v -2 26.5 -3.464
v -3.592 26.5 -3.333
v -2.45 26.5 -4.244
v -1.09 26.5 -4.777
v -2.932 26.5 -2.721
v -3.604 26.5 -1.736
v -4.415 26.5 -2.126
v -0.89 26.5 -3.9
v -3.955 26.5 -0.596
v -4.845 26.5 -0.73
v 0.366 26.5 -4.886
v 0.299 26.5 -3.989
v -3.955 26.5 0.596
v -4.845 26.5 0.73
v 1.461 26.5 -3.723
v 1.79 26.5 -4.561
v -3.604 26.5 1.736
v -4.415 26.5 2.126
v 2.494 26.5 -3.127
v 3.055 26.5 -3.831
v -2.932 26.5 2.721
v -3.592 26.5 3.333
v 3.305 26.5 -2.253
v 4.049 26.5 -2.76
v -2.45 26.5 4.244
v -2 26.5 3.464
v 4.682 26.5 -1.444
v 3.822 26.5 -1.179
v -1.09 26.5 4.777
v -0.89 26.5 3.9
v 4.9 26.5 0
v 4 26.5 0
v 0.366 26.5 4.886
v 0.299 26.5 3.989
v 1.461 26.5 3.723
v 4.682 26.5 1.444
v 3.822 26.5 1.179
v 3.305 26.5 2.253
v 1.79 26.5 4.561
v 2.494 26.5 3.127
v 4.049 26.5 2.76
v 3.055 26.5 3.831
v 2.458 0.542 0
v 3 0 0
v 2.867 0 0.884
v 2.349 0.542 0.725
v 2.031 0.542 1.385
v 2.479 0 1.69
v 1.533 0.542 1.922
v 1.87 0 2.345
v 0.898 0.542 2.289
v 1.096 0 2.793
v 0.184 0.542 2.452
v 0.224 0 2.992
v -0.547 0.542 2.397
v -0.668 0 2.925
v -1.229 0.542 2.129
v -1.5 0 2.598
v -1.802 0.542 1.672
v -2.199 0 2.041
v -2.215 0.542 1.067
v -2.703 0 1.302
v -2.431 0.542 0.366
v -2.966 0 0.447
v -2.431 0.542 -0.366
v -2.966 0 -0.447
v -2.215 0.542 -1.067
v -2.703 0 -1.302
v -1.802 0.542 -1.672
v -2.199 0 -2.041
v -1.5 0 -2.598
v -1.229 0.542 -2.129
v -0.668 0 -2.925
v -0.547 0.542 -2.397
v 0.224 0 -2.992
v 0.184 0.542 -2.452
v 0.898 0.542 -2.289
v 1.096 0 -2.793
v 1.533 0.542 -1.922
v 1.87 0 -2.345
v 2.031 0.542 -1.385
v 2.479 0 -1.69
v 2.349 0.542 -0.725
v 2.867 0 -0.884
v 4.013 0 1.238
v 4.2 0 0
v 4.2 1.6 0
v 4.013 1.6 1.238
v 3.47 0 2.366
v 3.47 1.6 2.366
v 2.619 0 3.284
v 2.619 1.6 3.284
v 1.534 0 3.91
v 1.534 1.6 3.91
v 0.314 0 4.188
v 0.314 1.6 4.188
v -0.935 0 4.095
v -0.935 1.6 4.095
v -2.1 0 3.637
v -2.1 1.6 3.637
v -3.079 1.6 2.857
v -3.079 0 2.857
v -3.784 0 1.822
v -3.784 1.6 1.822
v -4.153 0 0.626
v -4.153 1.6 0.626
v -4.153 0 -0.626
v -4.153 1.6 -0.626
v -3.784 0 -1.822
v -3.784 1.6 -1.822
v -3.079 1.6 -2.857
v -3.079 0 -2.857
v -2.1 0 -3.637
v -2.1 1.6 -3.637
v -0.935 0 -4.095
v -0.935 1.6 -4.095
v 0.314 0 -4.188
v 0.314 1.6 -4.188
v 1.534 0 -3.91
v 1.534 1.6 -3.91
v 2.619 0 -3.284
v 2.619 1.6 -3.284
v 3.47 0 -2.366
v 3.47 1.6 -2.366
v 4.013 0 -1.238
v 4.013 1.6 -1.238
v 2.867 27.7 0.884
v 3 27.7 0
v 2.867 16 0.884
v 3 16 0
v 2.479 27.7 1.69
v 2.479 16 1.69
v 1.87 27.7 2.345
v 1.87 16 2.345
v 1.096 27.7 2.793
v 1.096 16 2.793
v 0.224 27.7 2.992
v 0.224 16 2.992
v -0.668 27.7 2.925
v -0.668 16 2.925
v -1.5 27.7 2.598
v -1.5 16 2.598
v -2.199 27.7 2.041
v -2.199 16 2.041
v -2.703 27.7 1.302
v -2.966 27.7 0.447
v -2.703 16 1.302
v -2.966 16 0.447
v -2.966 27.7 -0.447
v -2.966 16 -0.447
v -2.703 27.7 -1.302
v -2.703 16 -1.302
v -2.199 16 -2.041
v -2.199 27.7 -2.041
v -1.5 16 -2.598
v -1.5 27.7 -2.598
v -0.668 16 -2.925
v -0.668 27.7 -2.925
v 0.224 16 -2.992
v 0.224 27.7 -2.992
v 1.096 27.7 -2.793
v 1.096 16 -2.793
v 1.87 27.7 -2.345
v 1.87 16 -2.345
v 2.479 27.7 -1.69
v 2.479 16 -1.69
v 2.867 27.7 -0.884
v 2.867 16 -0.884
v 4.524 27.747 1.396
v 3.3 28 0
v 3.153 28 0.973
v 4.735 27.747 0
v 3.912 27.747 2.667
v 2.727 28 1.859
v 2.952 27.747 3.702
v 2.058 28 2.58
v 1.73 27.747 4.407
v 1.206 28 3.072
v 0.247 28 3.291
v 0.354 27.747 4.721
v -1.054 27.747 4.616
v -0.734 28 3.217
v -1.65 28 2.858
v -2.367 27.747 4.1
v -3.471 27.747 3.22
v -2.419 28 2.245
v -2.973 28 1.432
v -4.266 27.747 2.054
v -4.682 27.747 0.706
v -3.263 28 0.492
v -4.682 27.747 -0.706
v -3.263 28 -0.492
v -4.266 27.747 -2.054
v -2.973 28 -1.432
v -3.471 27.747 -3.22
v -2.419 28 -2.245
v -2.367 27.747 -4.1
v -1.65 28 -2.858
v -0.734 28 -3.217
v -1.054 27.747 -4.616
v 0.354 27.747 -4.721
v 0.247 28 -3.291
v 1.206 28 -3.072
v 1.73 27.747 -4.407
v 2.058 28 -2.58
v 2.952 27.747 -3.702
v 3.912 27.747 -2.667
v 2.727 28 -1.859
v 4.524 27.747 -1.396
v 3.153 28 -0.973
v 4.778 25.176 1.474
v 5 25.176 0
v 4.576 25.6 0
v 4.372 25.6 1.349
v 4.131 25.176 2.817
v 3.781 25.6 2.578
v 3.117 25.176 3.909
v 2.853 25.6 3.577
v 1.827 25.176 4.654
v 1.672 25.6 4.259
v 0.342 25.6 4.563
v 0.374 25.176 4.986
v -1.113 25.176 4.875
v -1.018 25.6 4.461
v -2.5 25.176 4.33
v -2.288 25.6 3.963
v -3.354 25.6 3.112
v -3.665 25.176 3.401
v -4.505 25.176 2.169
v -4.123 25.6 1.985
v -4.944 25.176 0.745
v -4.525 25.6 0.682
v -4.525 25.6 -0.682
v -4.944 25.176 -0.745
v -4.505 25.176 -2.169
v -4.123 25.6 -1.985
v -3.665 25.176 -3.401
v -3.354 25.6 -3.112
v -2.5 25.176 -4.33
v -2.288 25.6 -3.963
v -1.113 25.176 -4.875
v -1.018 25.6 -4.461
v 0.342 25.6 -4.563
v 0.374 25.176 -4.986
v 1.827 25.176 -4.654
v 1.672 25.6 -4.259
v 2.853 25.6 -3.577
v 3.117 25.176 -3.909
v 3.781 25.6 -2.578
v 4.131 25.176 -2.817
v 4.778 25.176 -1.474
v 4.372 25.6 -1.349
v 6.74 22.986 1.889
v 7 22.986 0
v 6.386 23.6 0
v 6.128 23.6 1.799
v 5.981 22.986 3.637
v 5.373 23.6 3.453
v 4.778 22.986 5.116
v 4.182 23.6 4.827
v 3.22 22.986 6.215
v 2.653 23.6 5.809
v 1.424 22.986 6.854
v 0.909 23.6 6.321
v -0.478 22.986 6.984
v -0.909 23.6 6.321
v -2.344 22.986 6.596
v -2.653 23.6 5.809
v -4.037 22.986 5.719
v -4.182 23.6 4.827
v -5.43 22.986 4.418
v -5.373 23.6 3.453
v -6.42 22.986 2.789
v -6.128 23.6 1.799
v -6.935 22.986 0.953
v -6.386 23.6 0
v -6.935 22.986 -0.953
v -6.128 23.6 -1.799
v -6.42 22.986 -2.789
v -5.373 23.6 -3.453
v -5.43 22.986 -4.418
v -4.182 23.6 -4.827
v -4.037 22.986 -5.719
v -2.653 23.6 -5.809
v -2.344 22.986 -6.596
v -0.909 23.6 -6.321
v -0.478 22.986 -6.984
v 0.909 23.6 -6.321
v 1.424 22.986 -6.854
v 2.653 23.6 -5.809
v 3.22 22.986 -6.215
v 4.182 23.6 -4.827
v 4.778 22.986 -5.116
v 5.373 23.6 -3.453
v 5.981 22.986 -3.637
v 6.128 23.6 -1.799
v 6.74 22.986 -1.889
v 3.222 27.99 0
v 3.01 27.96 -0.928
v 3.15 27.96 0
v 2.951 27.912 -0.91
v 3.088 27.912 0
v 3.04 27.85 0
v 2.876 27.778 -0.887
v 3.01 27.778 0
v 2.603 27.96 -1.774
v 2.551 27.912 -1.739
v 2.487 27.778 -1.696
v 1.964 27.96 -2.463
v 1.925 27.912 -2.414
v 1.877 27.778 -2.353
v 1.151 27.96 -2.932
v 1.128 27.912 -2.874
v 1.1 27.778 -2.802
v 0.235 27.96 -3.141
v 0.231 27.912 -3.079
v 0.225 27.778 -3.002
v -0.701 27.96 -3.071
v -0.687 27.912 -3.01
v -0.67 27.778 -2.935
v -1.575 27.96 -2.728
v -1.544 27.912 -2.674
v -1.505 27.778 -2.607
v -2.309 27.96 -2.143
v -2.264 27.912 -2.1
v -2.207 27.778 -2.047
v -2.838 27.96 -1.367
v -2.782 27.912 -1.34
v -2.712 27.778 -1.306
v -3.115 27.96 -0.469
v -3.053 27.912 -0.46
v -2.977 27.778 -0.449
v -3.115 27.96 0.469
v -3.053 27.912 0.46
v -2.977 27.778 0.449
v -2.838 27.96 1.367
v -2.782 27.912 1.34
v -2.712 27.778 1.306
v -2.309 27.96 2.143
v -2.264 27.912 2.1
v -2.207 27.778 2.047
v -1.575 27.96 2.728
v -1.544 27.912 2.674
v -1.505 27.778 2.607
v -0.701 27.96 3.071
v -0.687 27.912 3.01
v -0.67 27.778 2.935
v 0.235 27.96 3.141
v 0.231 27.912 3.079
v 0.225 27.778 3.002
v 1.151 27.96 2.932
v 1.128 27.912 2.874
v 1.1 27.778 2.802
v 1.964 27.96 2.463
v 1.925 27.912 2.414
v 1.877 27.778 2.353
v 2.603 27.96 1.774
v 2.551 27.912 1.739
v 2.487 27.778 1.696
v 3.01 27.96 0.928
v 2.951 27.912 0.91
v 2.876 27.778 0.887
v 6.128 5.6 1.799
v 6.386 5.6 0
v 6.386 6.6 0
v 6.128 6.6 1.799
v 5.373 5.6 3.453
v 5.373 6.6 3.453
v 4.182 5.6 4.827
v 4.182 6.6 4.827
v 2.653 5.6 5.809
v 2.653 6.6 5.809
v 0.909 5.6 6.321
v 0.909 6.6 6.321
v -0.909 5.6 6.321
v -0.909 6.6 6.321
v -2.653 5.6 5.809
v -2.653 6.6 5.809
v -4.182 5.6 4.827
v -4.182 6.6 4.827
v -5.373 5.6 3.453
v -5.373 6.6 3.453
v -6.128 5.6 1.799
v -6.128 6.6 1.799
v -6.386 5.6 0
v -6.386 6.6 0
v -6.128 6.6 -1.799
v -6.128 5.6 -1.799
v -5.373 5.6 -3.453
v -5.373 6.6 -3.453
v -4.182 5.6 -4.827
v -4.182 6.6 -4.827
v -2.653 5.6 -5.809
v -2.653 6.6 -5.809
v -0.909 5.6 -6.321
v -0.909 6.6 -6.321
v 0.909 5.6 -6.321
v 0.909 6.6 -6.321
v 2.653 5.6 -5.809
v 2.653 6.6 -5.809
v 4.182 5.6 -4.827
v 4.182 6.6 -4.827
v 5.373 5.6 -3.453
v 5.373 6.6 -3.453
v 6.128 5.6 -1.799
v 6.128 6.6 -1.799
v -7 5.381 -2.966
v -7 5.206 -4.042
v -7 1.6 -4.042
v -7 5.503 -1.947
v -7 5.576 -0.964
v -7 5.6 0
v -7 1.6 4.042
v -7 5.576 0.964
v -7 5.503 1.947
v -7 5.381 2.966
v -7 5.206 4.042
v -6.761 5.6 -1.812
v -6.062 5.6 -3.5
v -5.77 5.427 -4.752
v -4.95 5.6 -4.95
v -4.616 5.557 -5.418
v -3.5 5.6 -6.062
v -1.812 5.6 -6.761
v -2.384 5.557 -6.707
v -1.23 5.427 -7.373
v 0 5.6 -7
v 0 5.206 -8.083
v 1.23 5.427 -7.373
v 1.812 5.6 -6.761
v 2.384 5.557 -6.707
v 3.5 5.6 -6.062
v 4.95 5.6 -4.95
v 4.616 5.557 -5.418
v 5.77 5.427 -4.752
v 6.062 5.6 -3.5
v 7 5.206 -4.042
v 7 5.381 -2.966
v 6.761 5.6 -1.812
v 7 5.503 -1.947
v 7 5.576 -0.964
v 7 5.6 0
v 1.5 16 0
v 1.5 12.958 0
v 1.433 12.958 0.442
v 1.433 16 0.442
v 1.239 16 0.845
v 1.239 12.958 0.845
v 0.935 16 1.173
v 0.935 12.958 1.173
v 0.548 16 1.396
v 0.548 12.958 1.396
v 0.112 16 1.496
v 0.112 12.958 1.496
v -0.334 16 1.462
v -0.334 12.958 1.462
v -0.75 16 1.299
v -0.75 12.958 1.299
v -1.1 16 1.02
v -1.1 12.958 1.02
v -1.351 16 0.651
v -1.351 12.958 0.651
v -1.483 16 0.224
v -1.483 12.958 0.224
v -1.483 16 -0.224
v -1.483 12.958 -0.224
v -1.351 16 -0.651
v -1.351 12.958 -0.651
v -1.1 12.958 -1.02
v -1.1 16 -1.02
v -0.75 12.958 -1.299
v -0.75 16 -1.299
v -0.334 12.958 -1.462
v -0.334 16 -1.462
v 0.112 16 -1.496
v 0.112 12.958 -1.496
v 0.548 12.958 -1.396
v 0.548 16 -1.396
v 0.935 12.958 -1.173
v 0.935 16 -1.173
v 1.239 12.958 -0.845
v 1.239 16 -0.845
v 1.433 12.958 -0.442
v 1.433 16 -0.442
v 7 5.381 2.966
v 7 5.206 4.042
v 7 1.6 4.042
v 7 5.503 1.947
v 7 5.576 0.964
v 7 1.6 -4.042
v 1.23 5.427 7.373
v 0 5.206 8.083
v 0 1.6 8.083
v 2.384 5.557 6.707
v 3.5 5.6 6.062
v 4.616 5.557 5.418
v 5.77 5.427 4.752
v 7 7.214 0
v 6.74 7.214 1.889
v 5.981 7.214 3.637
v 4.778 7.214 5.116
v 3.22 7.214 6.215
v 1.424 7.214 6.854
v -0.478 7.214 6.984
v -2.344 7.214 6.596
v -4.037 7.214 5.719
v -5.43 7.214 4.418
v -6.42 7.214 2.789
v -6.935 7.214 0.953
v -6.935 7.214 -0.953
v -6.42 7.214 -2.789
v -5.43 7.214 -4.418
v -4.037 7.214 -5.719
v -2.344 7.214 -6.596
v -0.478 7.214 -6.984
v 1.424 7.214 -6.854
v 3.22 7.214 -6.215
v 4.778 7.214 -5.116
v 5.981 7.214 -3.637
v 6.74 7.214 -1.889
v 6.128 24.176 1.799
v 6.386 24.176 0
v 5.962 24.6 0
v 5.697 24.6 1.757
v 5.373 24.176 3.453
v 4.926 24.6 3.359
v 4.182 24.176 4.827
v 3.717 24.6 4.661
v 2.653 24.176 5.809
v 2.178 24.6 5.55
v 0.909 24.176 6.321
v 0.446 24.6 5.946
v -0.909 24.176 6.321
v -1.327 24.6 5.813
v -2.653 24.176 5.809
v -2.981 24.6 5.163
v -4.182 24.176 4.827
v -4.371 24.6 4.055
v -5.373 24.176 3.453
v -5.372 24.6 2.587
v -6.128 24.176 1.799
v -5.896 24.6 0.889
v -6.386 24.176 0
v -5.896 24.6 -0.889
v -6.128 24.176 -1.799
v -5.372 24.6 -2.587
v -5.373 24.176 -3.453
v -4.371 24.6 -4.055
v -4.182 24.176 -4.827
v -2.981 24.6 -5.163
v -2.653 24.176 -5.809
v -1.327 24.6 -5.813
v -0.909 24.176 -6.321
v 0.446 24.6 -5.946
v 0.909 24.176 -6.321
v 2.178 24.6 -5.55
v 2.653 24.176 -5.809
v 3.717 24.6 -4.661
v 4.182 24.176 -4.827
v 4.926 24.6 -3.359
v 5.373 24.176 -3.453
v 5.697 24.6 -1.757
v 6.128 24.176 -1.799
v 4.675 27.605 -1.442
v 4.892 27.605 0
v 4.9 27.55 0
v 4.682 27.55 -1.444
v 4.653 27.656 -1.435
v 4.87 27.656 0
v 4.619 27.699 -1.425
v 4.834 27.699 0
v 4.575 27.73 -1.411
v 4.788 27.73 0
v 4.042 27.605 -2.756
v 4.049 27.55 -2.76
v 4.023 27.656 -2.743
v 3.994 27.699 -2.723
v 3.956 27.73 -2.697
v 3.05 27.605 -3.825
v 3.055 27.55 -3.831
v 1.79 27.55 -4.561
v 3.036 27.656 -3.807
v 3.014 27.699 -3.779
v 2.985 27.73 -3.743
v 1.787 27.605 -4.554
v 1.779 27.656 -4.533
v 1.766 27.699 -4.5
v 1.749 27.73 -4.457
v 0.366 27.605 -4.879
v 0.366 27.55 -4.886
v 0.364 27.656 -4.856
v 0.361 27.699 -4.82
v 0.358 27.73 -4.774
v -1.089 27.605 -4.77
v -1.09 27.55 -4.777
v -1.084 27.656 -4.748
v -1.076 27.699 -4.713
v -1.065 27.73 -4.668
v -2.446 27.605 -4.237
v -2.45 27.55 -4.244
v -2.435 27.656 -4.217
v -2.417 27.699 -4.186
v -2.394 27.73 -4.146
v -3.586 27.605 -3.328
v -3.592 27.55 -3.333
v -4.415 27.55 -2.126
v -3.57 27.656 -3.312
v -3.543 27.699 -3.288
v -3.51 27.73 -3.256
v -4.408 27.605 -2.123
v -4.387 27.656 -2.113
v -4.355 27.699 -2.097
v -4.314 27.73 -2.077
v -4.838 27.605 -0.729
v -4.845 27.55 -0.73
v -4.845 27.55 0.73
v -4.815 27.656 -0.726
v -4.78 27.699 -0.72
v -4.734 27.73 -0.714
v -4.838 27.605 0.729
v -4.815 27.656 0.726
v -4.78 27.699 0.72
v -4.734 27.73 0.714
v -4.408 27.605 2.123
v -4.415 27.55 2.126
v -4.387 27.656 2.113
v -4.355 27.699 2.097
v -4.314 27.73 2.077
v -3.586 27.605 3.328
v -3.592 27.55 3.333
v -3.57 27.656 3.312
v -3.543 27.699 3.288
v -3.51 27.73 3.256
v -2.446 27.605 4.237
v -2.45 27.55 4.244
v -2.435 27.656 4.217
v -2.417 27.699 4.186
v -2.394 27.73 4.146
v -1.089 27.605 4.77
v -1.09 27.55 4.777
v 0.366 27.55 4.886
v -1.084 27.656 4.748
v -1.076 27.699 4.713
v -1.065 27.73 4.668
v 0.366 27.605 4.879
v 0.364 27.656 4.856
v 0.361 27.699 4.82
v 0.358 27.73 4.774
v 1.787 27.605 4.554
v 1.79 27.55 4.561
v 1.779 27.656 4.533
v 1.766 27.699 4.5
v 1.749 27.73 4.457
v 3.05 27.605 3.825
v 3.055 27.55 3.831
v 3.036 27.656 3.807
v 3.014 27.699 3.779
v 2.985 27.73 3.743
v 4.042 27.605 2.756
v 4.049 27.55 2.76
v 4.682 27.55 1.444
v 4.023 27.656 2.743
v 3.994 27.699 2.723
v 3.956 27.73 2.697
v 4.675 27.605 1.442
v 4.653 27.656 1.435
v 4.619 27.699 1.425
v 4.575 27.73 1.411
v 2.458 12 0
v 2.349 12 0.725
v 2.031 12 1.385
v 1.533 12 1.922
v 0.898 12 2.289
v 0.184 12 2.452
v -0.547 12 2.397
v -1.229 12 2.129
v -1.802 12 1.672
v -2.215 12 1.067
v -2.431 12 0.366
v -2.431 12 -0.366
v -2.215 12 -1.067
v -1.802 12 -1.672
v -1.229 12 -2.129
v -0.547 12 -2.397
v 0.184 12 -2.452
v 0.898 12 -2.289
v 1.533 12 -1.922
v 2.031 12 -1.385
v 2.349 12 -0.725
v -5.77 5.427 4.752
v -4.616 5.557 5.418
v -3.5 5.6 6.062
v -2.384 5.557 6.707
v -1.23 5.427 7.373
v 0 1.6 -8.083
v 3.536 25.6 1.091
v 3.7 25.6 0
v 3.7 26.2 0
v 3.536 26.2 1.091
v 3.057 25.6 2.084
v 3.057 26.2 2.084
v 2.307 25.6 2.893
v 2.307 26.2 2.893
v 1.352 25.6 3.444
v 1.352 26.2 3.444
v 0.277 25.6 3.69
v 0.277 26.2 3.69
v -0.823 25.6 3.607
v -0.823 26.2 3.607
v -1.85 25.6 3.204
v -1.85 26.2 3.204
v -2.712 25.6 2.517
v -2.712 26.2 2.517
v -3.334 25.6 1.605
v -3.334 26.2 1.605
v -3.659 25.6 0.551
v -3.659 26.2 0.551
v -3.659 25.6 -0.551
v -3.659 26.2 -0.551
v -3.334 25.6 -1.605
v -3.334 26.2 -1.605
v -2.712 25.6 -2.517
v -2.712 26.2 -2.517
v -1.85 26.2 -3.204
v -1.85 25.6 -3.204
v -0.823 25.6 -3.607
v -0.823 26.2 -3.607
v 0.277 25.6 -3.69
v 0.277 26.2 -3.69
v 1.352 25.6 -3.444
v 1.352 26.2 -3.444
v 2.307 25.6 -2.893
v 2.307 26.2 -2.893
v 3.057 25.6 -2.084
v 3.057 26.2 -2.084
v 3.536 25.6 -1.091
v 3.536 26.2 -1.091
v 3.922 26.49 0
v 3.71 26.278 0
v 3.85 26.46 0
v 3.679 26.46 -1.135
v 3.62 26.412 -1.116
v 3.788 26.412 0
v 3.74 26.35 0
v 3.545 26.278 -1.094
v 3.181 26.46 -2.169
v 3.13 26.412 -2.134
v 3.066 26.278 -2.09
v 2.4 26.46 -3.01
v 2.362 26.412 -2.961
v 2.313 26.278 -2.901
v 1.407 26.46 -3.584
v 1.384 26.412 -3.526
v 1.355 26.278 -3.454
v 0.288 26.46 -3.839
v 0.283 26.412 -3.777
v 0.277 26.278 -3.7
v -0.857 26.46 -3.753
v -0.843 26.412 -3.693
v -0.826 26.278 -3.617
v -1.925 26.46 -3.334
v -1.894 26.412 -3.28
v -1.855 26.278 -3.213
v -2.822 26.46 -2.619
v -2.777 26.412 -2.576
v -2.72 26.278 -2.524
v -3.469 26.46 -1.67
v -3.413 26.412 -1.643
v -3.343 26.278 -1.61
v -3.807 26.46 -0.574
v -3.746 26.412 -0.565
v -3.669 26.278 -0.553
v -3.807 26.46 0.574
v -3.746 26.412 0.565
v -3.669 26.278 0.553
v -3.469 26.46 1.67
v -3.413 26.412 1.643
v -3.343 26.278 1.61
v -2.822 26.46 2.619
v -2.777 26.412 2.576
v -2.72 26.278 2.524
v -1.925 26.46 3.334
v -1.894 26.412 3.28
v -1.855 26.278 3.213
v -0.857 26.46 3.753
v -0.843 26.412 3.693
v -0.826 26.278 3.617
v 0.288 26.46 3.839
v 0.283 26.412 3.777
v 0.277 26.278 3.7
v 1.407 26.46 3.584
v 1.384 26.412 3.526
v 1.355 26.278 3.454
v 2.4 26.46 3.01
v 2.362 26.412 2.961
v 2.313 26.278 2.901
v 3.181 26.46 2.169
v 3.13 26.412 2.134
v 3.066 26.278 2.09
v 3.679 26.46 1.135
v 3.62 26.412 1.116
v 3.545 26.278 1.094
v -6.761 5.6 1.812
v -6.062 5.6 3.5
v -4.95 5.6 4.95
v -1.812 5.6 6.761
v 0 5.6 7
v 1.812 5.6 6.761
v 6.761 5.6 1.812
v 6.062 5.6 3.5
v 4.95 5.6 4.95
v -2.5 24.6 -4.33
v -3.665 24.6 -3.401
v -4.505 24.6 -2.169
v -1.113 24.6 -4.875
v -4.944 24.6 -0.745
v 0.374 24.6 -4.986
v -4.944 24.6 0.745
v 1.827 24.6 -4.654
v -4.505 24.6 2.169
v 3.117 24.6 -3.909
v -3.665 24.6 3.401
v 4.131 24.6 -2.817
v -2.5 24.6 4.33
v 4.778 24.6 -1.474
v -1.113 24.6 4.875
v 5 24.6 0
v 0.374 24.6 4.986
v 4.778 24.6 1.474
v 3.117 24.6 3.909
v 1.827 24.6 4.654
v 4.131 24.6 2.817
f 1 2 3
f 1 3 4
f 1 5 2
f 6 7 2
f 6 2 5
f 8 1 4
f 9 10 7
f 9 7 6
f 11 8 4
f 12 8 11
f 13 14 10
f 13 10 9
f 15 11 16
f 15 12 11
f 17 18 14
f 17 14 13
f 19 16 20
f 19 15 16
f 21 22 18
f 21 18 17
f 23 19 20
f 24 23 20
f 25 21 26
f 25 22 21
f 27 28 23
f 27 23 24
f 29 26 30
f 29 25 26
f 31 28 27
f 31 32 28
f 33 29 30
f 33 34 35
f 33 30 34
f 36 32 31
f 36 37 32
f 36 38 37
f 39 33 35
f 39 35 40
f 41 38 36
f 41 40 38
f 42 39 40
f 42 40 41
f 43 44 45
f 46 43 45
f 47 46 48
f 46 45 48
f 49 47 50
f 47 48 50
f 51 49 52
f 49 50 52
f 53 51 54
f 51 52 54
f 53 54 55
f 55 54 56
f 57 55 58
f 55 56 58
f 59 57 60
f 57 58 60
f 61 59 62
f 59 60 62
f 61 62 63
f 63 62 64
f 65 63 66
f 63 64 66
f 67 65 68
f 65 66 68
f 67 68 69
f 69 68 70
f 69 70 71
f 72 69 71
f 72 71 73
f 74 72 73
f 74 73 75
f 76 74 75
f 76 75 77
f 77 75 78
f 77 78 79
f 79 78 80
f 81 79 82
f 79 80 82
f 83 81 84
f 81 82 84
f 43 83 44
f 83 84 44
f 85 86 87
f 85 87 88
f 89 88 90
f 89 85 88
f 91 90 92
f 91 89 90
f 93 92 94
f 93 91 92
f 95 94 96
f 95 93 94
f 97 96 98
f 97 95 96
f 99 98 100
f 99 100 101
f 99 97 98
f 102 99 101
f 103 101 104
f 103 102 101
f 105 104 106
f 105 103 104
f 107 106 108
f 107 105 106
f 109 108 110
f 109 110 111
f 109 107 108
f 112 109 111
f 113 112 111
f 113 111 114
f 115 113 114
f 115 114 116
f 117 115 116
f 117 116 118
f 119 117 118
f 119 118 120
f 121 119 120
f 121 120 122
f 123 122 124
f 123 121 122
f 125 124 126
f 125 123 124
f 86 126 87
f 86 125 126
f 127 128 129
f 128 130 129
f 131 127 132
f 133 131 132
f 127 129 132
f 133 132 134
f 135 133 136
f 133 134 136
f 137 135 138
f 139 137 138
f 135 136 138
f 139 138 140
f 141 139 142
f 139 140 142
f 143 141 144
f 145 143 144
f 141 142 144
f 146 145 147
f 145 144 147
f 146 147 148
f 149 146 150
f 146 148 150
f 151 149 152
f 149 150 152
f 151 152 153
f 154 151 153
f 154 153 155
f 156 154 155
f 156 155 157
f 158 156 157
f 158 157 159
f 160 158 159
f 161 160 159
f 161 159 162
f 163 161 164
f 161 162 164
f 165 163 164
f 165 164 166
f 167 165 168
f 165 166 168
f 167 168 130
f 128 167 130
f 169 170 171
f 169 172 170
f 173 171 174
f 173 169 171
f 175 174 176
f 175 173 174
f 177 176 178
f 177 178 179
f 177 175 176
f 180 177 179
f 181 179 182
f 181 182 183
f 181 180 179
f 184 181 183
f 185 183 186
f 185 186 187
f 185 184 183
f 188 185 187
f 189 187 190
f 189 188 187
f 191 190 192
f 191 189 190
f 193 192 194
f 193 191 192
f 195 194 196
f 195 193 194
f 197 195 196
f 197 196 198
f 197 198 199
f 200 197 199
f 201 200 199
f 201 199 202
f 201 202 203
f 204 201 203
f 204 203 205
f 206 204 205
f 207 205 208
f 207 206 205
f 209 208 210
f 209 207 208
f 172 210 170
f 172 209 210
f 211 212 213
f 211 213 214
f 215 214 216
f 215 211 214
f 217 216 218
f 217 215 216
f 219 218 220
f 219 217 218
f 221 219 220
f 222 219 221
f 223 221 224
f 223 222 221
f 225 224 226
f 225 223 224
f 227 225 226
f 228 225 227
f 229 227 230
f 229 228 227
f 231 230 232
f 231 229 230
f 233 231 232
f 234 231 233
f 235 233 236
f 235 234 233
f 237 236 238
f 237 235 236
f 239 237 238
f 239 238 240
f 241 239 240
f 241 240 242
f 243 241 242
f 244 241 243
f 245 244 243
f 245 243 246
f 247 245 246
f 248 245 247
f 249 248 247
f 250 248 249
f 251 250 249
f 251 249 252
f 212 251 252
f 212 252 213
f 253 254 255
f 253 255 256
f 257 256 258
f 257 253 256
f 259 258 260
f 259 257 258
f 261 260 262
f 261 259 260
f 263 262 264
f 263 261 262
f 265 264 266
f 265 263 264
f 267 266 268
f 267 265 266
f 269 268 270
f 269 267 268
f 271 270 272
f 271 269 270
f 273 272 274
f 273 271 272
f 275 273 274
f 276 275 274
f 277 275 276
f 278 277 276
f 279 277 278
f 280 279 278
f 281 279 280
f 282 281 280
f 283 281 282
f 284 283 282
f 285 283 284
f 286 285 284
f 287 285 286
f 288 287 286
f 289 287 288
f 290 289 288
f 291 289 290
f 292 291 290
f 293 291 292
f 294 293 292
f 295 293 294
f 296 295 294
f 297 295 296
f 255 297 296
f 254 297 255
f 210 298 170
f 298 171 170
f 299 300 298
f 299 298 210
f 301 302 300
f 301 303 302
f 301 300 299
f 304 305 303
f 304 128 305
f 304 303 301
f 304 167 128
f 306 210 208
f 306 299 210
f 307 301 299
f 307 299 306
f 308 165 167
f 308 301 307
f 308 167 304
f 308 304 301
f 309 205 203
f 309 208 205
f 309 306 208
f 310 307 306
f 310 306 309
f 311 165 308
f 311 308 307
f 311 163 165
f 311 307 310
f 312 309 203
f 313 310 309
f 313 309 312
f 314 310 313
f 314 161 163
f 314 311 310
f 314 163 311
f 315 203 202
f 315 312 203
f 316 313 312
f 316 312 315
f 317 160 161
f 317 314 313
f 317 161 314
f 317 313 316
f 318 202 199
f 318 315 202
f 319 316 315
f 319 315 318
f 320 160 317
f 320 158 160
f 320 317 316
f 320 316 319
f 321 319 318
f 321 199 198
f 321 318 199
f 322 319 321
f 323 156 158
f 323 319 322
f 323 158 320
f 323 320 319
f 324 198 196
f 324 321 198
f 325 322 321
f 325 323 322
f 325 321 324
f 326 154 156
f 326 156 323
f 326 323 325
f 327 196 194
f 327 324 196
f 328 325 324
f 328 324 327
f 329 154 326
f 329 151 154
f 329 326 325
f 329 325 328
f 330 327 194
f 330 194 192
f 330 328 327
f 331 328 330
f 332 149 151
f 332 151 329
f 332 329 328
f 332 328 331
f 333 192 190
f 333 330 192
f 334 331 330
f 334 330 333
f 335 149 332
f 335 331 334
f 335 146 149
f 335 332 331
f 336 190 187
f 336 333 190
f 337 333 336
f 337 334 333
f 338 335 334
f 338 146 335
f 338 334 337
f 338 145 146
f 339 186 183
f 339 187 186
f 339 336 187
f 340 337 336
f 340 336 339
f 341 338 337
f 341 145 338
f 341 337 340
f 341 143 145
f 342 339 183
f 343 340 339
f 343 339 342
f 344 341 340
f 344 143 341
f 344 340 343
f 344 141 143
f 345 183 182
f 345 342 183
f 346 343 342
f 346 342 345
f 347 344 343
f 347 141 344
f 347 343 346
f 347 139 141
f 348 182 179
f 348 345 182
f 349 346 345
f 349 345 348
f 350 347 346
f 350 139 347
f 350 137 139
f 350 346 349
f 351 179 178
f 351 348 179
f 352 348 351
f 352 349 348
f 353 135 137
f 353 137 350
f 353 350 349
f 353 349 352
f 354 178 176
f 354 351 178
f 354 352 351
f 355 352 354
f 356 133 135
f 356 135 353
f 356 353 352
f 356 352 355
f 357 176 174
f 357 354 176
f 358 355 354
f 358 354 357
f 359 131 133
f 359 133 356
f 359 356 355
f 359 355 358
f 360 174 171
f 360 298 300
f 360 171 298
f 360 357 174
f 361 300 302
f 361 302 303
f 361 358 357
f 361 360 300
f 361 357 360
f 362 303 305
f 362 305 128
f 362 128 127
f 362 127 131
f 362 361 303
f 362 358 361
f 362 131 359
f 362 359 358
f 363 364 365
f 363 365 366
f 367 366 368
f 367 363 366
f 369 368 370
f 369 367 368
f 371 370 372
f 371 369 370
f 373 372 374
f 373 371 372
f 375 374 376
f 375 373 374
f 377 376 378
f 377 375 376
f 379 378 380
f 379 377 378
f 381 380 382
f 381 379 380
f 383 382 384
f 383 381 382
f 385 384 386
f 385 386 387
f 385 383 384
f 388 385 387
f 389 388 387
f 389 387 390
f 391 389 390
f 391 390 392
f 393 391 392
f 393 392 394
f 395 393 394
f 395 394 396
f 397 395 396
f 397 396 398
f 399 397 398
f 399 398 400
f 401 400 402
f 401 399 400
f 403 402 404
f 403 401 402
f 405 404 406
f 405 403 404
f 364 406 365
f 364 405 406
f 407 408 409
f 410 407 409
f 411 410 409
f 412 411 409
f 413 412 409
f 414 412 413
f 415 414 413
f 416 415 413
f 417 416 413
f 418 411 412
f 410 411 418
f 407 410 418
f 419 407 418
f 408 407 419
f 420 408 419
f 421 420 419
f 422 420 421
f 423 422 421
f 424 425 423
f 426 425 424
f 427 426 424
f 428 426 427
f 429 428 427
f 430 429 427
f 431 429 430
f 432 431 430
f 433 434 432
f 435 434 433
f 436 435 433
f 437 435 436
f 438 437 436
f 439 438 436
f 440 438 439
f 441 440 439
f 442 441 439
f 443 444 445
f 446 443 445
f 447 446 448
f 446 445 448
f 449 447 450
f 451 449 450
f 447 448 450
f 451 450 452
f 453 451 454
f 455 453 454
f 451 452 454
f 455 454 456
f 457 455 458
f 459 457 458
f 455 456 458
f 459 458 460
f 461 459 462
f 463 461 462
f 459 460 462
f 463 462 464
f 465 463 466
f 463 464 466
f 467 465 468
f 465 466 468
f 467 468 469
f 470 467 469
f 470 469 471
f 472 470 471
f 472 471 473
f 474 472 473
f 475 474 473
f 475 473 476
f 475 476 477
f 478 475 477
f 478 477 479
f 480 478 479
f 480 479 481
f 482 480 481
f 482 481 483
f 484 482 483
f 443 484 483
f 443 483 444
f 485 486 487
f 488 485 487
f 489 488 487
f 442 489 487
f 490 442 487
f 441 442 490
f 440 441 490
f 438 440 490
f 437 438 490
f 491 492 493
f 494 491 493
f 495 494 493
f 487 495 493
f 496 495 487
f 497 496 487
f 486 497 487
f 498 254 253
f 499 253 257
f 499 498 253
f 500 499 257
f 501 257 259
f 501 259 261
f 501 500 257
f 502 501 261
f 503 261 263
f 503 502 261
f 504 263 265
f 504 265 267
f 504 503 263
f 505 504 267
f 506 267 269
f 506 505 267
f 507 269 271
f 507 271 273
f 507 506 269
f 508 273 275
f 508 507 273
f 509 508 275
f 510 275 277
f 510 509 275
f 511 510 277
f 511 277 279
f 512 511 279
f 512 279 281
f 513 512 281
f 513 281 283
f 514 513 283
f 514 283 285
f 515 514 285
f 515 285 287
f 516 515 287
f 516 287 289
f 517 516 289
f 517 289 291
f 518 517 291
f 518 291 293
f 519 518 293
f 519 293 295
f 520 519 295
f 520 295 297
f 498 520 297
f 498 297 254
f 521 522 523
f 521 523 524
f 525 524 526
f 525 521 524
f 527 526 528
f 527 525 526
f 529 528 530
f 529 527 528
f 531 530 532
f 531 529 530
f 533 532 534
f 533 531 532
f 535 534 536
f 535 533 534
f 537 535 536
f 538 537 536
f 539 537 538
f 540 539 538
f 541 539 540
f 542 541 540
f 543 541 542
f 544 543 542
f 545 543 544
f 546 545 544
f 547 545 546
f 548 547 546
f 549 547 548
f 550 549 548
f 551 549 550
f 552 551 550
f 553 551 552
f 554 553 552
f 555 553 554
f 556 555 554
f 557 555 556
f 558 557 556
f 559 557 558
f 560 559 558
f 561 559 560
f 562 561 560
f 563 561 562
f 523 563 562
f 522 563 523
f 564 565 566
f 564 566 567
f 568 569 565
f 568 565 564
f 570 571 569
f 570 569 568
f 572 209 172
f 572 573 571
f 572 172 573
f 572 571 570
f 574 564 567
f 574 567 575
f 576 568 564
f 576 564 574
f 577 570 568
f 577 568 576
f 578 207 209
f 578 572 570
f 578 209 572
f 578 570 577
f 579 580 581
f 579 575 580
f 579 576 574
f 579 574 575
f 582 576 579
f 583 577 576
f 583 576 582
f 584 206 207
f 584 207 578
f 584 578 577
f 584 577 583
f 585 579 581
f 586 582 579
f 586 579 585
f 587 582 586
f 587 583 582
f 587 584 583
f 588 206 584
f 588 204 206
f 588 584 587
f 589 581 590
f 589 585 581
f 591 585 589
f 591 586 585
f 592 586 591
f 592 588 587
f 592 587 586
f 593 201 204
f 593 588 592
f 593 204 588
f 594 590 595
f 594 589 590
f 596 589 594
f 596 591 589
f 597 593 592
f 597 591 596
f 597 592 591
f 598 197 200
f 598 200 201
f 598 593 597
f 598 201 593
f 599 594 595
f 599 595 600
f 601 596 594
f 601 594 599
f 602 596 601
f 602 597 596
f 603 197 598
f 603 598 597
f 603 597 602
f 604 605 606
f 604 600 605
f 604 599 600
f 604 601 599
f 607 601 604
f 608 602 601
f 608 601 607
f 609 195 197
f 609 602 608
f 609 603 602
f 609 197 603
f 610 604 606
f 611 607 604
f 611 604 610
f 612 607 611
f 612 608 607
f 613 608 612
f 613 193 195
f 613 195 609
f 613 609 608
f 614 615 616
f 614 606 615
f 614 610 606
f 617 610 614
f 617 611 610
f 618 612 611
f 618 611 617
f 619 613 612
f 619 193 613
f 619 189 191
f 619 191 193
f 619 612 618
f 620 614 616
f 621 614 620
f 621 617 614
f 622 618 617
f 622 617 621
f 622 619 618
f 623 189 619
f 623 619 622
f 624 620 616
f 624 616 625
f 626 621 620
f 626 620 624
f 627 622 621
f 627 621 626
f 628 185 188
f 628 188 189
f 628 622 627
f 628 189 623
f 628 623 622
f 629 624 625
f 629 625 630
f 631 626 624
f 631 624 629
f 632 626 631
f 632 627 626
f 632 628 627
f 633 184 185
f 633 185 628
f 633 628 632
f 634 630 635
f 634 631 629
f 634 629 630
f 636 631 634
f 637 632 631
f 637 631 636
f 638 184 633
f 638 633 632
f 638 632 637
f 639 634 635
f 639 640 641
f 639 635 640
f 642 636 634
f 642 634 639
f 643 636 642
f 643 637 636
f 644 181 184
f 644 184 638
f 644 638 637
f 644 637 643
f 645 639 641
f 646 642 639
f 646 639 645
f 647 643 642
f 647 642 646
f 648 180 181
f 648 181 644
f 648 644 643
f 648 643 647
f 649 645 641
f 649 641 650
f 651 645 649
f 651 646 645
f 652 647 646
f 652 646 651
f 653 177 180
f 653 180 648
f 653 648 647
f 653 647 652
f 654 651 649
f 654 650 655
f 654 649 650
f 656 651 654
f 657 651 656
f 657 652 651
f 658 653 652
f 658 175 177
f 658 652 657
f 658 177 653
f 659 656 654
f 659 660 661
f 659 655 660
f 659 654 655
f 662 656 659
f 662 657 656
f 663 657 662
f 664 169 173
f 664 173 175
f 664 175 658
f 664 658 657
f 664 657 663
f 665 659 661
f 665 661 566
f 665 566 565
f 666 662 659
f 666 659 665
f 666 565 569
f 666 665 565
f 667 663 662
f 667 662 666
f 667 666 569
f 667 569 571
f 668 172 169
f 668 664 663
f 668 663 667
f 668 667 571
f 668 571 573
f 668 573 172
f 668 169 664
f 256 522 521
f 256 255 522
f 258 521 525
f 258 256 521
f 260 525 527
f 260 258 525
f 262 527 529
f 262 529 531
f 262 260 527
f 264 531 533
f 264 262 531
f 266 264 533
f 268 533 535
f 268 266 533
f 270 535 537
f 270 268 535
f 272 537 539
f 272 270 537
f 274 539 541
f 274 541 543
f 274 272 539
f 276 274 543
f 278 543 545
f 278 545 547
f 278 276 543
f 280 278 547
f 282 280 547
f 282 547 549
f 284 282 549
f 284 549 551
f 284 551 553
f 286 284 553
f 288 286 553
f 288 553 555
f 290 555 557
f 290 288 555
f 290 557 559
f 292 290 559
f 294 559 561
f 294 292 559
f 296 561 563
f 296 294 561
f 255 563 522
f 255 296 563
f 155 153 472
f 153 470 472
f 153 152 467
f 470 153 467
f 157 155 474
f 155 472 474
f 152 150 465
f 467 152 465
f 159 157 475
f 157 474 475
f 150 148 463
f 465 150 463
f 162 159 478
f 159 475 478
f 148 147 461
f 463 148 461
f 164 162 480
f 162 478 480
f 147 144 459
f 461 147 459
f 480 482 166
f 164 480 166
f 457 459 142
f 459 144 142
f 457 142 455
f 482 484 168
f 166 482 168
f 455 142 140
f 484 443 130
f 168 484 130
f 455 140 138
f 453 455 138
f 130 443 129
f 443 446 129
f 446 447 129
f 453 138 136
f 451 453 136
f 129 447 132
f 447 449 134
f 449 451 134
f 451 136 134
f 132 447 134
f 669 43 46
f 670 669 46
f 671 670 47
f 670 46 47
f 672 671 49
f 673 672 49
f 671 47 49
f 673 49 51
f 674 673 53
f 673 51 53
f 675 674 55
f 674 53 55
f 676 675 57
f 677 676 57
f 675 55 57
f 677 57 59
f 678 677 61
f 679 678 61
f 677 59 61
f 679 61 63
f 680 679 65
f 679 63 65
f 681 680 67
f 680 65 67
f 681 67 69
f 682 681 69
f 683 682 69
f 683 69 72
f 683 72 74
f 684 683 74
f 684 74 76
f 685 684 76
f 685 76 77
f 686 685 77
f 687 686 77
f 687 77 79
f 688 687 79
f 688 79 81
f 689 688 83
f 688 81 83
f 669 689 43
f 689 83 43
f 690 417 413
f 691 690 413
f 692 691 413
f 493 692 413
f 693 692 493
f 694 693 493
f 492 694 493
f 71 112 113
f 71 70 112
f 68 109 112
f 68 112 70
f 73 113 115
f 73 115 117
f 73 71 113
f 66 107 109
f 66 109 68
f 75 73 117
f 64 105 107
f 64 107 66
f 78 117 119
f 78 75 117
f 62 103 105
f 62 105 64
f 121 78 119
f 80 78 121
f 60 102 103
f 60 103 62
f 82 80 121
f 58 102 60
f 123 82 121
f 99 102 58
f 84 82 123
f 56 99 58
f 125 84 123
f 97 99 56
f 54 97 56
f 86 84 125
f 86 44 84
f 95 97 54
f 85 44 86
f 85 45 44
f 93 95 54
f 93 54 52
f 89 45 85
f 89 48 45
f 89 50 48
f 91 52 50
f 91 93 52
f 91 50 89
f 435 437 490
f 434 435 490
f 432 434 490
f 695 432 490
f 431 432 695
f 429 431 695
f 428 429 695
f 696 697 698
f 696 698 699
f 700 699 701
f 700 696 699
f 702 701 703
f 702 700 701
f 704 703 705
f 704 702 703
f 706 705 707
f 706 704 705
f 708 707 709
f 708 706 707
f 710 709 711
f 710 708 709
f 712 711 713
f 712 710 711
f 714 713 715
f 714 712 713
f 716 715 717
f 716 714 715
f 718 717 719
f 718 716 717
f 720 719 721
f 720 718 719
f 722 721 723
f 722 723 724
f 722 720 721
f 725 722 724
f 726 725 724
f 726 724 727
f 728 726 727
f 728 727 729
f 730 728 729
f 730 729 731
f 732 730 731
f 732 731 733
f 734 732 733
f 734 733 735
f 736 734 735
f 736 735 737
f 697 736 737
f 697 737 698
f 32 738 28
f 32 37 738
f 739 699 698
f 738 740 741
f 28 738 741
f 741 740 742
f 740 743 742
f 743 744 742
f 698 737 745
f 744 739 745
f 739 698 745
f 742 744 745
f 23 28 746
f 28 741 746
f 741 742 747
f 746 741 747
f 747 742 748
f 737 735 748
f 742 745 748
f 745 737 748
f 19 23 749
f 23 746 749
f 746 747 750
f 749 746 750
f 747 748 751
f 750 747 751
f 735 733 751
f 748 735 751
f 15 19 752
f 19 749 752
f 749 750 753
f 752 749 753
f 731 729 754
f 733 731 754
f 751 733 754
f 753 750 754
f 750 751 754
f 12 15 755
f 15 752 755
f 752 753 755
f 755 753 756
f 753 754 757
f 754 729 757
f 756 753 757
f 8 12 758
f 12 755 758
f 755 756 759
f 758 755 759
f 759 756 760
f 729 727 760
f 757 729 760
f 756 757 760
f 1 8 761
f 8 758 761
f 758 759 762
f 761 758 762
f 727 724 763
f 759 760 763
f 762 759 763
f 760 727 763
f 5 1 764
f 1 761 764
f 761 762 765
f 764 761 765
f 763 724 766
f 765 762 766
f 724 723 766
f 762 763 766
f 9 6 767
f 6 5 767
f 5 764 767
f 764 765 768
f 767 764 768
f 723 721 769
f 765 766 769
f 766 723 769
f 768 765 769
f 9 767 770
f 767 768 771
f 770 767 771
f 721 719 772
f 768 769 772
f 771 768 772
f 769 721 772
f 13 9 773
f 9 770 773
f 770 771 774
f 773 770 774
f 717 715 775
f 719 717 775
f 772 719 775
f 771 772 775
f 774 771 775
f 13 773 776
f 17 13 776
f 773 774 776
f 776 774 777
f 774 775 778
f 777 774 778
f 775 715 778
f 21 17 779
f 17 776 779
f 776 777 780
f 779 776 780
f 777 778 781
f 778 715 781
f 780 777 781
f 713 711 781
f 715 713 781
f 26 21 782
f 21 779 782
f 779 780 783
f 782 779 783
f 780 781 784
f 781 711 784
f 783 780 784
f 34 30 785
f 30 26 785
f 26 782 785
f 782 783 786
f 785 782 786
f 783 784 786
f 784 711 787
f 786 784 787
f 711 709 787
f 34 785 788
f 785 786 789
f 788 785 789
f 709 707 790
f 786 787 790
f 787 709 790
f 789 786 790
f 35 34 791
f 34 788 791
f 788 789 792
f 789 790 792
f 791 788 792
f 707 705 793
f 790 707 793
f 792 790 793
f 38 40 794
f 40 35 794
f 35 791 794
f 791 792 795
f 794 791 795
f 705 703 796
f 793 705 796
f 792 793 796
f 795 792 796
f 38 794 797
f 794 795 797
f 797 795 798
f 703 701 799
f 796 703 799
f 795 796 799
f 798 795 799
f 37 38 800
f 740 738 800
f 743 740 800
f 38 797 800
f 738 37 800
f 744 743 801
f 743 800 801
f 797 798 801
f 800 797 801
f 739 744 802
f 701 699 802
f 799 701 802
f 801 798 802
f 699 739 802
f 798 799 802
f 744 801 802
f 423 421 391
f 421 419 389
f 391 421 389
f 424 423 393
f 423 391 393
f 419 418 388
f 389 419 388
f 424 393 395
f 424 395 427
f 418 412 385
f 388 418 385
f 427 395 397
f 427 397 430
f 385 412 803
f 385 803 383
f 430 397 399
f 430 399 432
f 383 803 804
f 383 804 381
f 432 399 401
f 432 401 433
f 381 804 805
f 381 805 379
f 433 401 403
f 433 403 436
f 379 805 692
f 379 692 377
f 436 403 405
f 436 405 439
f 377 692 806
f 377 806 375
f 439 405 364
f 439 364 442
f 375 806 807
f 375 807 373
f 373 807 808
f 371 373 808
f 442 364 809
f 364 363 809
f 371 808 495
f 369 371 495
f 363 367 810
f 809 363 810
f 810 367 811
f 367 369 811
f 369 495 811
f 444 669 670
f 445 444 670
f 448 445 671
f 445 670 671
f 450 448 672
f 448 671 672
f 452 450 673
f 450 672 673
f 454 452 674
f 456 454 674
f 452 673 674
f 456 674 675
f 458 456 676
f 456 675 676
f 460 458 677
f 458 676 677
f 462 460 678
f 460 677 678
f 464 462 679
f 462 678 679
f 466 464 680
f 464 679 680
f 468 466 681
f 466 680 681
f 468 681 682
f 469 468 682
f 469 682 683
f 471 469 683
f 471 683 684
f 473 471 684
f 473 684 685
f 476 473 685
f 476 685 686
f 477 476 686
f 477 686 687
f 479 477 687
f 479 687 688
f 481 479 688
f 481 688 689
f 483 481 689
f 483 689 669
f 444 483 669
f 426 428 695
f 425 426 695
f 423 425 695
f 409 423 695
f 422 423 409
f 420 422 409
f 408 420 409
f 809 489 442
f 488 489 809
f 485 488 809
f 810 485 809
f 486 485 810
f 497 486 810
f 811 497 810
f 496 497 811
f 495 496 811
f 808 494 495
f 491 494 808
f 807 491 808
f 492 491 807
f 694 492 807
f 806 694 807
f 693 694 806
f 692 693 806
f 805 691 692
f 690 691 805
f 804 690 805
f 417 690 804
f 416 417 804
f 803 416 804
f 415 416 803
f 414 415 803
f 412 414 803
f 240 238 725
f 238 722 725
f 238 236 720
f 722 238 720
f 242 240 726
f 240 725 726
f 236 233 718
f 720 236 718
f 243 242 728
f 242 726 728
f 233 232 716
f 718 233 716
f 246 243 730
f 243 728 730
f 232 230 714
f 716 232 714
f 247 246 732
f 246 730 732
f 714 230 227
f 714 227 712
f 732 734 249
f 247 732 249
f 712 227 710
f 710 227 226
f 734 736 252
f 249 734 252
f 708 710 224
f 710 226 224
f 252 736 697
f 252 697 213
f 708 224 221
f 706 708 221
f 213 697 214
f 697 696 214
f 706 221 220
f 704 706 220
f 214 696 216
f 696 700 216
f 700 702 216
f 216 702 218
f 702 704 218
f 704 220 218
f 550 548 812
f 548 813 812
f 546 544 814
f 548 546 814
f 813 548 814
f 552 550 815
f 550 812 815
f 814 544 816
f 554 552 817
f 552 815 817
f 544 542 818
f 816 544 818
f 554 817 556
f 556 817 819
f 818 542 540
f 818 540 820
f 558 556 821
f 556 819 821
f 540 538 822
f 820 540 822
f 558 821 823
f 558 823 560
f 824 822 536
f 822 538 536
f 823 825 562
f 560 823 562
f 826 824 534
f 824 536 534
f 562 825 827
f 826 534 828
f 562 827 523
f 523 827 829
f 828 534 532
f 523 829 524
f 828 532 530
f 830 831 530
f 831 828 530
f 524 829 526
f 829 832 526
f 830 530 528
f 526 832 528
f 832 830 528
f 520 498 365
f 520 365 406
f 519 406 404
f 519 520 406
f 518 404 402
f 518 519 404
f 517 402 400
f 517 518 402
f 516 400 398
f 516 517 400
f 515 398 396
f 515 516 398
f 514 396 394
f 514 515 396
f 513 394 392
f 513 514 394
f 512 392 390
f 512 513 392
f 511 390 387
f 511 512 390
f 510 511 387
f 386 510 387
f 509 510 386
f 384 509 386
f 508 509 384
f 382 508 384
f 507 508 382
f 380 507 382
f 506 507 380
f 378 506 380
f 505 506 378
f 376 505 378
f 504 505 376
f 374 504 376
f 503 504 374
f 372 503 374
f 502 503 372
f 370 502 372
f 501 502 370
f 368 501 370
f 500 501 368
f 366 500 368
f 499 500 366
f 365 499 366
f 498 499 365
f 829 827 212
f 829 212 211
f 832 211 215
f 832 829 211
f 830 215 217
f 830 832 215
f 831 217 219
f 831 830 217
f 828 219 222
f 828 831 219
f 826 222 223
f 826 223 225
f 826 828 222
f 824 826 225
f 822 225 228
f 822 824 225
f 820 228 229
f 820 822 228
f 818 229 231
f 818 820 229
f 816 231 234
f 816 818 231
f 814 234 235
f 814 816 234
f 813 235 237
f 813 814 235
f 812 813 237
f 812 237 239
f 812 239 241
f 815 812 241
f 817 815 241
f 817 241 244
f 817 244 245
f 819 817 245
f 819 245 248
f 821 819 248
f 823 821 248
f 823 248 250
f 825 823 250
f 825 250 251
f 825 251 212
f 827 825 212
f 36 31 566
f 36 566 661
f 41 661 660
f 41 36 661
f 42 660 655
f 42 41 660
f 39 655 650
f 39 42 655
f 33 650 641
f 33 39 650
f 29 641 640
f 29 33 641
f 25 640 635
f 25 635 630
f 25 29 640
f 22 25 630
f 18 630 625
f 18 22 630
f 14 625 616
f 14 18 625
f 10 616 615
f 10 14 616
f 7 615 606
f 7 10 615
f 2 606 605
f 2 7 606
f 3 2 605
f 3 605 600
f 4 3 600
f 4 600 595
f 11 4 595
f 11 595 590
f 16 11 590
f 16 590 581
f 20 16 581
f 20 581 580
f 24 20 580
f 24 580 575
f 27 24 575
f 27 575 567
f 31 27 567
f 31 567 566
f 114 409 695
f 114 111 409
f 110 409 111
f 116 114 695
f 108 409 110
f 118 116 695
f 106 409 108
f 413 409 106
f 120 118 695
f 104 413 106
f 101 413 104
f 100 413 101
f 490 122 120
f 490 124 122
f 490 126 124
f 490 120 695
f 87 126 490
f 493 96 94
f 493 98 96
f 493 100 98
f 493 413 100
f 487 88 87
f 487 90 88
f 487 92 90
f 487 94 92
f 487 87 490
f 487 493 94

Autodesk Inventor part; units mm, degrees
sketch "Sketch_2" plane through (0, 0, 0) normal (0, 0, 1) x (1, 0, 0)
  line L0 (0, 0) -> (0, 28)
  line L1 (0, 28) -> (3.3, 28)
  line L2 (3.3, 28) -> (4.7347, 27.747)
  arc A0 (4.9, 27.5501) -> (4.7347, 27.747) centre (4.7, 27.5501) ccw
  line L3 (4.9, 27.5501) -> (4.9, 26.5)
  line L4 (4.9, 26.5) -> (4, 26.5)
  arc A1 (4, 26.5) -> (3.7, 26.2) centre (4, 26.2) ccw
  line L5 (3.7, 26.2) -> (3.7, 25.6)
  line L6 (3.7, 25.6) -> (4.5757, 25.6)
  line L7 (4.5757, 25.6) -> (5, 25.1757)
  line L8 (5, 25.1757) -> (5, 24.6)
  line L9 (5, 24.6) -> (5.9622, 24.6)
  line L10 (5.9622, 24.6) -> (6.3865, 24.1757)
  line L11 (6.3865, 24.1757) -> (6.3865, 23.6)
  line L12 (6.3865, 23.6) -> (7, 22.9865)
  line L13 (7, 22.9865) -> (7, 7.2135)
  line L14 (7, 7.2135) -> (6.3865, 6.6)
  line L15 (6.3865, 6.6) -> (6.3865, 5.6)
  line L16 (6.3865, 5.6) -> (7, 5.6)
  line L17 (7, 5.6) -> (8.4, 5.0904)
  line L18 (8.4, 5.0904) -> (8.4, 1.6)
  line L19 (8.4, 1.6) -> (4.2, 1.6)
  line L20 (4.2, 1.6) -> (4.2, 0)
  line L21 (4.2, 0) -> (0, 0)
  line L22 (0, 0) -> (0, 28)
revolve "Revolution1" add sketch "Sketch_2" angle 360 about axis through (0, 0, 0) along (0, -1, 0)
thread "Thread1" size "M14x1" class "6g" standard "ISO Metric profile" full length
sketch "Sketch_3" plane through (0, 0, 0) normal (0, 0, 1) x (1, 0, 0)
  line L0 (0, 0) -> (0, 28)
  line L1 (0, 28) -> (3.3, 28)
  arc A0 (3.3, 28) -> (3, 27.7) centre (3.3, 27.7) ccw
  line L2 (3, 27.7) -> (3, 16)
  line L3 (3, 16) -> (1.5, 16)
  line L4 (1.5, 16) -> (1.5, 12.9585)
  line L5 (1.5, 12.9585) -> (2.4585, 12)
  line L6 (2.4585, 12) -> (2.4585, 0.5415)
  line L7 (2.4585, 0.5415) -> (3, 0)
  line L8 (3, 0) -> (0, 0)
  line L9 (0, 0) -> (0, 28)
revolve "Revolution2" cut sketch "Sketch_3" angle 360 about axis through (0, 0, 0) along (0, -1, 0)
thread "Thread2" size "M6x1" class "6H" standard "ISO Metric profile" full length
sketch "Sketch_1" plane through (0, 5.6, 0) normal (0, 1, 0) x (1, 0, 0)
  line L0 (-13.4451, -13.8453) -> (13.2851, -13.8453)
  line L1 (13.2851, -13.8453) -> (13.2851, 13.6852)
  line L2 (13.2851, 13.6852) -> (-13.4451, 13.6852)
  line L3 (-13.4451, 13.6852) -> (-13.4451, -13.8453)
  line L4 (-7, -4.0415) -> (0, -8.0829)
  line L5 (0, -8.0829) -> (7, -4.0415)
  line L6 (7, -4.0415) -> (7, 4.0415)
  line L7 (7, 4.0415) -> (0, 8.0829)
  line L8 (0, 8.0829) -> (-7, 4.0415)
  line L9 (-7, 4.0415) -> (-7, -4.0415)
extrude "Extrusion1" cut sketch "Sketch_1" against normal blind 5.6
ref_plane "MUTTER1_XY" through (0, 10, 0) normal (0, 1, 0) x (1, 0, 0)
ref_plane "MUTTER1_YZ" through (0, 10, 0) normal (1, 0, 0) x (0, 0, -1)
ref_plane "MUTTER1_ZX" through (0, 10, 0) normal (0, 0, -1) x (0, 1, 0)
ref_plane "MUTTER2_XY" through (0, 18, 0) normal (0, 1, 0) x (1, 0, 0)
ref_plane "MUTTER2_YZ" through (0, 18, 0) normal (1, 0, 0) x (0, 0, -1)
ref_plane "MUTTER2_ZX" through (0, 18, 0) normal (0, 0, -1) x (0, 1, 0)
ref_plane "Sauger_XY" through (0, 0, 0) normal (0, 1, 0) x (1, 0, 0)
ref_plane "Sauger_YZ" through (0, 0, 0) normal (1, 0, 0) x (0, 0, -1)
ref_plane "Sauger_ZX" through (0, 0, 0) normal (0, 0, -1) x (0, 1, 0)
properties part number "189199 ESH-HA-4-QS"
